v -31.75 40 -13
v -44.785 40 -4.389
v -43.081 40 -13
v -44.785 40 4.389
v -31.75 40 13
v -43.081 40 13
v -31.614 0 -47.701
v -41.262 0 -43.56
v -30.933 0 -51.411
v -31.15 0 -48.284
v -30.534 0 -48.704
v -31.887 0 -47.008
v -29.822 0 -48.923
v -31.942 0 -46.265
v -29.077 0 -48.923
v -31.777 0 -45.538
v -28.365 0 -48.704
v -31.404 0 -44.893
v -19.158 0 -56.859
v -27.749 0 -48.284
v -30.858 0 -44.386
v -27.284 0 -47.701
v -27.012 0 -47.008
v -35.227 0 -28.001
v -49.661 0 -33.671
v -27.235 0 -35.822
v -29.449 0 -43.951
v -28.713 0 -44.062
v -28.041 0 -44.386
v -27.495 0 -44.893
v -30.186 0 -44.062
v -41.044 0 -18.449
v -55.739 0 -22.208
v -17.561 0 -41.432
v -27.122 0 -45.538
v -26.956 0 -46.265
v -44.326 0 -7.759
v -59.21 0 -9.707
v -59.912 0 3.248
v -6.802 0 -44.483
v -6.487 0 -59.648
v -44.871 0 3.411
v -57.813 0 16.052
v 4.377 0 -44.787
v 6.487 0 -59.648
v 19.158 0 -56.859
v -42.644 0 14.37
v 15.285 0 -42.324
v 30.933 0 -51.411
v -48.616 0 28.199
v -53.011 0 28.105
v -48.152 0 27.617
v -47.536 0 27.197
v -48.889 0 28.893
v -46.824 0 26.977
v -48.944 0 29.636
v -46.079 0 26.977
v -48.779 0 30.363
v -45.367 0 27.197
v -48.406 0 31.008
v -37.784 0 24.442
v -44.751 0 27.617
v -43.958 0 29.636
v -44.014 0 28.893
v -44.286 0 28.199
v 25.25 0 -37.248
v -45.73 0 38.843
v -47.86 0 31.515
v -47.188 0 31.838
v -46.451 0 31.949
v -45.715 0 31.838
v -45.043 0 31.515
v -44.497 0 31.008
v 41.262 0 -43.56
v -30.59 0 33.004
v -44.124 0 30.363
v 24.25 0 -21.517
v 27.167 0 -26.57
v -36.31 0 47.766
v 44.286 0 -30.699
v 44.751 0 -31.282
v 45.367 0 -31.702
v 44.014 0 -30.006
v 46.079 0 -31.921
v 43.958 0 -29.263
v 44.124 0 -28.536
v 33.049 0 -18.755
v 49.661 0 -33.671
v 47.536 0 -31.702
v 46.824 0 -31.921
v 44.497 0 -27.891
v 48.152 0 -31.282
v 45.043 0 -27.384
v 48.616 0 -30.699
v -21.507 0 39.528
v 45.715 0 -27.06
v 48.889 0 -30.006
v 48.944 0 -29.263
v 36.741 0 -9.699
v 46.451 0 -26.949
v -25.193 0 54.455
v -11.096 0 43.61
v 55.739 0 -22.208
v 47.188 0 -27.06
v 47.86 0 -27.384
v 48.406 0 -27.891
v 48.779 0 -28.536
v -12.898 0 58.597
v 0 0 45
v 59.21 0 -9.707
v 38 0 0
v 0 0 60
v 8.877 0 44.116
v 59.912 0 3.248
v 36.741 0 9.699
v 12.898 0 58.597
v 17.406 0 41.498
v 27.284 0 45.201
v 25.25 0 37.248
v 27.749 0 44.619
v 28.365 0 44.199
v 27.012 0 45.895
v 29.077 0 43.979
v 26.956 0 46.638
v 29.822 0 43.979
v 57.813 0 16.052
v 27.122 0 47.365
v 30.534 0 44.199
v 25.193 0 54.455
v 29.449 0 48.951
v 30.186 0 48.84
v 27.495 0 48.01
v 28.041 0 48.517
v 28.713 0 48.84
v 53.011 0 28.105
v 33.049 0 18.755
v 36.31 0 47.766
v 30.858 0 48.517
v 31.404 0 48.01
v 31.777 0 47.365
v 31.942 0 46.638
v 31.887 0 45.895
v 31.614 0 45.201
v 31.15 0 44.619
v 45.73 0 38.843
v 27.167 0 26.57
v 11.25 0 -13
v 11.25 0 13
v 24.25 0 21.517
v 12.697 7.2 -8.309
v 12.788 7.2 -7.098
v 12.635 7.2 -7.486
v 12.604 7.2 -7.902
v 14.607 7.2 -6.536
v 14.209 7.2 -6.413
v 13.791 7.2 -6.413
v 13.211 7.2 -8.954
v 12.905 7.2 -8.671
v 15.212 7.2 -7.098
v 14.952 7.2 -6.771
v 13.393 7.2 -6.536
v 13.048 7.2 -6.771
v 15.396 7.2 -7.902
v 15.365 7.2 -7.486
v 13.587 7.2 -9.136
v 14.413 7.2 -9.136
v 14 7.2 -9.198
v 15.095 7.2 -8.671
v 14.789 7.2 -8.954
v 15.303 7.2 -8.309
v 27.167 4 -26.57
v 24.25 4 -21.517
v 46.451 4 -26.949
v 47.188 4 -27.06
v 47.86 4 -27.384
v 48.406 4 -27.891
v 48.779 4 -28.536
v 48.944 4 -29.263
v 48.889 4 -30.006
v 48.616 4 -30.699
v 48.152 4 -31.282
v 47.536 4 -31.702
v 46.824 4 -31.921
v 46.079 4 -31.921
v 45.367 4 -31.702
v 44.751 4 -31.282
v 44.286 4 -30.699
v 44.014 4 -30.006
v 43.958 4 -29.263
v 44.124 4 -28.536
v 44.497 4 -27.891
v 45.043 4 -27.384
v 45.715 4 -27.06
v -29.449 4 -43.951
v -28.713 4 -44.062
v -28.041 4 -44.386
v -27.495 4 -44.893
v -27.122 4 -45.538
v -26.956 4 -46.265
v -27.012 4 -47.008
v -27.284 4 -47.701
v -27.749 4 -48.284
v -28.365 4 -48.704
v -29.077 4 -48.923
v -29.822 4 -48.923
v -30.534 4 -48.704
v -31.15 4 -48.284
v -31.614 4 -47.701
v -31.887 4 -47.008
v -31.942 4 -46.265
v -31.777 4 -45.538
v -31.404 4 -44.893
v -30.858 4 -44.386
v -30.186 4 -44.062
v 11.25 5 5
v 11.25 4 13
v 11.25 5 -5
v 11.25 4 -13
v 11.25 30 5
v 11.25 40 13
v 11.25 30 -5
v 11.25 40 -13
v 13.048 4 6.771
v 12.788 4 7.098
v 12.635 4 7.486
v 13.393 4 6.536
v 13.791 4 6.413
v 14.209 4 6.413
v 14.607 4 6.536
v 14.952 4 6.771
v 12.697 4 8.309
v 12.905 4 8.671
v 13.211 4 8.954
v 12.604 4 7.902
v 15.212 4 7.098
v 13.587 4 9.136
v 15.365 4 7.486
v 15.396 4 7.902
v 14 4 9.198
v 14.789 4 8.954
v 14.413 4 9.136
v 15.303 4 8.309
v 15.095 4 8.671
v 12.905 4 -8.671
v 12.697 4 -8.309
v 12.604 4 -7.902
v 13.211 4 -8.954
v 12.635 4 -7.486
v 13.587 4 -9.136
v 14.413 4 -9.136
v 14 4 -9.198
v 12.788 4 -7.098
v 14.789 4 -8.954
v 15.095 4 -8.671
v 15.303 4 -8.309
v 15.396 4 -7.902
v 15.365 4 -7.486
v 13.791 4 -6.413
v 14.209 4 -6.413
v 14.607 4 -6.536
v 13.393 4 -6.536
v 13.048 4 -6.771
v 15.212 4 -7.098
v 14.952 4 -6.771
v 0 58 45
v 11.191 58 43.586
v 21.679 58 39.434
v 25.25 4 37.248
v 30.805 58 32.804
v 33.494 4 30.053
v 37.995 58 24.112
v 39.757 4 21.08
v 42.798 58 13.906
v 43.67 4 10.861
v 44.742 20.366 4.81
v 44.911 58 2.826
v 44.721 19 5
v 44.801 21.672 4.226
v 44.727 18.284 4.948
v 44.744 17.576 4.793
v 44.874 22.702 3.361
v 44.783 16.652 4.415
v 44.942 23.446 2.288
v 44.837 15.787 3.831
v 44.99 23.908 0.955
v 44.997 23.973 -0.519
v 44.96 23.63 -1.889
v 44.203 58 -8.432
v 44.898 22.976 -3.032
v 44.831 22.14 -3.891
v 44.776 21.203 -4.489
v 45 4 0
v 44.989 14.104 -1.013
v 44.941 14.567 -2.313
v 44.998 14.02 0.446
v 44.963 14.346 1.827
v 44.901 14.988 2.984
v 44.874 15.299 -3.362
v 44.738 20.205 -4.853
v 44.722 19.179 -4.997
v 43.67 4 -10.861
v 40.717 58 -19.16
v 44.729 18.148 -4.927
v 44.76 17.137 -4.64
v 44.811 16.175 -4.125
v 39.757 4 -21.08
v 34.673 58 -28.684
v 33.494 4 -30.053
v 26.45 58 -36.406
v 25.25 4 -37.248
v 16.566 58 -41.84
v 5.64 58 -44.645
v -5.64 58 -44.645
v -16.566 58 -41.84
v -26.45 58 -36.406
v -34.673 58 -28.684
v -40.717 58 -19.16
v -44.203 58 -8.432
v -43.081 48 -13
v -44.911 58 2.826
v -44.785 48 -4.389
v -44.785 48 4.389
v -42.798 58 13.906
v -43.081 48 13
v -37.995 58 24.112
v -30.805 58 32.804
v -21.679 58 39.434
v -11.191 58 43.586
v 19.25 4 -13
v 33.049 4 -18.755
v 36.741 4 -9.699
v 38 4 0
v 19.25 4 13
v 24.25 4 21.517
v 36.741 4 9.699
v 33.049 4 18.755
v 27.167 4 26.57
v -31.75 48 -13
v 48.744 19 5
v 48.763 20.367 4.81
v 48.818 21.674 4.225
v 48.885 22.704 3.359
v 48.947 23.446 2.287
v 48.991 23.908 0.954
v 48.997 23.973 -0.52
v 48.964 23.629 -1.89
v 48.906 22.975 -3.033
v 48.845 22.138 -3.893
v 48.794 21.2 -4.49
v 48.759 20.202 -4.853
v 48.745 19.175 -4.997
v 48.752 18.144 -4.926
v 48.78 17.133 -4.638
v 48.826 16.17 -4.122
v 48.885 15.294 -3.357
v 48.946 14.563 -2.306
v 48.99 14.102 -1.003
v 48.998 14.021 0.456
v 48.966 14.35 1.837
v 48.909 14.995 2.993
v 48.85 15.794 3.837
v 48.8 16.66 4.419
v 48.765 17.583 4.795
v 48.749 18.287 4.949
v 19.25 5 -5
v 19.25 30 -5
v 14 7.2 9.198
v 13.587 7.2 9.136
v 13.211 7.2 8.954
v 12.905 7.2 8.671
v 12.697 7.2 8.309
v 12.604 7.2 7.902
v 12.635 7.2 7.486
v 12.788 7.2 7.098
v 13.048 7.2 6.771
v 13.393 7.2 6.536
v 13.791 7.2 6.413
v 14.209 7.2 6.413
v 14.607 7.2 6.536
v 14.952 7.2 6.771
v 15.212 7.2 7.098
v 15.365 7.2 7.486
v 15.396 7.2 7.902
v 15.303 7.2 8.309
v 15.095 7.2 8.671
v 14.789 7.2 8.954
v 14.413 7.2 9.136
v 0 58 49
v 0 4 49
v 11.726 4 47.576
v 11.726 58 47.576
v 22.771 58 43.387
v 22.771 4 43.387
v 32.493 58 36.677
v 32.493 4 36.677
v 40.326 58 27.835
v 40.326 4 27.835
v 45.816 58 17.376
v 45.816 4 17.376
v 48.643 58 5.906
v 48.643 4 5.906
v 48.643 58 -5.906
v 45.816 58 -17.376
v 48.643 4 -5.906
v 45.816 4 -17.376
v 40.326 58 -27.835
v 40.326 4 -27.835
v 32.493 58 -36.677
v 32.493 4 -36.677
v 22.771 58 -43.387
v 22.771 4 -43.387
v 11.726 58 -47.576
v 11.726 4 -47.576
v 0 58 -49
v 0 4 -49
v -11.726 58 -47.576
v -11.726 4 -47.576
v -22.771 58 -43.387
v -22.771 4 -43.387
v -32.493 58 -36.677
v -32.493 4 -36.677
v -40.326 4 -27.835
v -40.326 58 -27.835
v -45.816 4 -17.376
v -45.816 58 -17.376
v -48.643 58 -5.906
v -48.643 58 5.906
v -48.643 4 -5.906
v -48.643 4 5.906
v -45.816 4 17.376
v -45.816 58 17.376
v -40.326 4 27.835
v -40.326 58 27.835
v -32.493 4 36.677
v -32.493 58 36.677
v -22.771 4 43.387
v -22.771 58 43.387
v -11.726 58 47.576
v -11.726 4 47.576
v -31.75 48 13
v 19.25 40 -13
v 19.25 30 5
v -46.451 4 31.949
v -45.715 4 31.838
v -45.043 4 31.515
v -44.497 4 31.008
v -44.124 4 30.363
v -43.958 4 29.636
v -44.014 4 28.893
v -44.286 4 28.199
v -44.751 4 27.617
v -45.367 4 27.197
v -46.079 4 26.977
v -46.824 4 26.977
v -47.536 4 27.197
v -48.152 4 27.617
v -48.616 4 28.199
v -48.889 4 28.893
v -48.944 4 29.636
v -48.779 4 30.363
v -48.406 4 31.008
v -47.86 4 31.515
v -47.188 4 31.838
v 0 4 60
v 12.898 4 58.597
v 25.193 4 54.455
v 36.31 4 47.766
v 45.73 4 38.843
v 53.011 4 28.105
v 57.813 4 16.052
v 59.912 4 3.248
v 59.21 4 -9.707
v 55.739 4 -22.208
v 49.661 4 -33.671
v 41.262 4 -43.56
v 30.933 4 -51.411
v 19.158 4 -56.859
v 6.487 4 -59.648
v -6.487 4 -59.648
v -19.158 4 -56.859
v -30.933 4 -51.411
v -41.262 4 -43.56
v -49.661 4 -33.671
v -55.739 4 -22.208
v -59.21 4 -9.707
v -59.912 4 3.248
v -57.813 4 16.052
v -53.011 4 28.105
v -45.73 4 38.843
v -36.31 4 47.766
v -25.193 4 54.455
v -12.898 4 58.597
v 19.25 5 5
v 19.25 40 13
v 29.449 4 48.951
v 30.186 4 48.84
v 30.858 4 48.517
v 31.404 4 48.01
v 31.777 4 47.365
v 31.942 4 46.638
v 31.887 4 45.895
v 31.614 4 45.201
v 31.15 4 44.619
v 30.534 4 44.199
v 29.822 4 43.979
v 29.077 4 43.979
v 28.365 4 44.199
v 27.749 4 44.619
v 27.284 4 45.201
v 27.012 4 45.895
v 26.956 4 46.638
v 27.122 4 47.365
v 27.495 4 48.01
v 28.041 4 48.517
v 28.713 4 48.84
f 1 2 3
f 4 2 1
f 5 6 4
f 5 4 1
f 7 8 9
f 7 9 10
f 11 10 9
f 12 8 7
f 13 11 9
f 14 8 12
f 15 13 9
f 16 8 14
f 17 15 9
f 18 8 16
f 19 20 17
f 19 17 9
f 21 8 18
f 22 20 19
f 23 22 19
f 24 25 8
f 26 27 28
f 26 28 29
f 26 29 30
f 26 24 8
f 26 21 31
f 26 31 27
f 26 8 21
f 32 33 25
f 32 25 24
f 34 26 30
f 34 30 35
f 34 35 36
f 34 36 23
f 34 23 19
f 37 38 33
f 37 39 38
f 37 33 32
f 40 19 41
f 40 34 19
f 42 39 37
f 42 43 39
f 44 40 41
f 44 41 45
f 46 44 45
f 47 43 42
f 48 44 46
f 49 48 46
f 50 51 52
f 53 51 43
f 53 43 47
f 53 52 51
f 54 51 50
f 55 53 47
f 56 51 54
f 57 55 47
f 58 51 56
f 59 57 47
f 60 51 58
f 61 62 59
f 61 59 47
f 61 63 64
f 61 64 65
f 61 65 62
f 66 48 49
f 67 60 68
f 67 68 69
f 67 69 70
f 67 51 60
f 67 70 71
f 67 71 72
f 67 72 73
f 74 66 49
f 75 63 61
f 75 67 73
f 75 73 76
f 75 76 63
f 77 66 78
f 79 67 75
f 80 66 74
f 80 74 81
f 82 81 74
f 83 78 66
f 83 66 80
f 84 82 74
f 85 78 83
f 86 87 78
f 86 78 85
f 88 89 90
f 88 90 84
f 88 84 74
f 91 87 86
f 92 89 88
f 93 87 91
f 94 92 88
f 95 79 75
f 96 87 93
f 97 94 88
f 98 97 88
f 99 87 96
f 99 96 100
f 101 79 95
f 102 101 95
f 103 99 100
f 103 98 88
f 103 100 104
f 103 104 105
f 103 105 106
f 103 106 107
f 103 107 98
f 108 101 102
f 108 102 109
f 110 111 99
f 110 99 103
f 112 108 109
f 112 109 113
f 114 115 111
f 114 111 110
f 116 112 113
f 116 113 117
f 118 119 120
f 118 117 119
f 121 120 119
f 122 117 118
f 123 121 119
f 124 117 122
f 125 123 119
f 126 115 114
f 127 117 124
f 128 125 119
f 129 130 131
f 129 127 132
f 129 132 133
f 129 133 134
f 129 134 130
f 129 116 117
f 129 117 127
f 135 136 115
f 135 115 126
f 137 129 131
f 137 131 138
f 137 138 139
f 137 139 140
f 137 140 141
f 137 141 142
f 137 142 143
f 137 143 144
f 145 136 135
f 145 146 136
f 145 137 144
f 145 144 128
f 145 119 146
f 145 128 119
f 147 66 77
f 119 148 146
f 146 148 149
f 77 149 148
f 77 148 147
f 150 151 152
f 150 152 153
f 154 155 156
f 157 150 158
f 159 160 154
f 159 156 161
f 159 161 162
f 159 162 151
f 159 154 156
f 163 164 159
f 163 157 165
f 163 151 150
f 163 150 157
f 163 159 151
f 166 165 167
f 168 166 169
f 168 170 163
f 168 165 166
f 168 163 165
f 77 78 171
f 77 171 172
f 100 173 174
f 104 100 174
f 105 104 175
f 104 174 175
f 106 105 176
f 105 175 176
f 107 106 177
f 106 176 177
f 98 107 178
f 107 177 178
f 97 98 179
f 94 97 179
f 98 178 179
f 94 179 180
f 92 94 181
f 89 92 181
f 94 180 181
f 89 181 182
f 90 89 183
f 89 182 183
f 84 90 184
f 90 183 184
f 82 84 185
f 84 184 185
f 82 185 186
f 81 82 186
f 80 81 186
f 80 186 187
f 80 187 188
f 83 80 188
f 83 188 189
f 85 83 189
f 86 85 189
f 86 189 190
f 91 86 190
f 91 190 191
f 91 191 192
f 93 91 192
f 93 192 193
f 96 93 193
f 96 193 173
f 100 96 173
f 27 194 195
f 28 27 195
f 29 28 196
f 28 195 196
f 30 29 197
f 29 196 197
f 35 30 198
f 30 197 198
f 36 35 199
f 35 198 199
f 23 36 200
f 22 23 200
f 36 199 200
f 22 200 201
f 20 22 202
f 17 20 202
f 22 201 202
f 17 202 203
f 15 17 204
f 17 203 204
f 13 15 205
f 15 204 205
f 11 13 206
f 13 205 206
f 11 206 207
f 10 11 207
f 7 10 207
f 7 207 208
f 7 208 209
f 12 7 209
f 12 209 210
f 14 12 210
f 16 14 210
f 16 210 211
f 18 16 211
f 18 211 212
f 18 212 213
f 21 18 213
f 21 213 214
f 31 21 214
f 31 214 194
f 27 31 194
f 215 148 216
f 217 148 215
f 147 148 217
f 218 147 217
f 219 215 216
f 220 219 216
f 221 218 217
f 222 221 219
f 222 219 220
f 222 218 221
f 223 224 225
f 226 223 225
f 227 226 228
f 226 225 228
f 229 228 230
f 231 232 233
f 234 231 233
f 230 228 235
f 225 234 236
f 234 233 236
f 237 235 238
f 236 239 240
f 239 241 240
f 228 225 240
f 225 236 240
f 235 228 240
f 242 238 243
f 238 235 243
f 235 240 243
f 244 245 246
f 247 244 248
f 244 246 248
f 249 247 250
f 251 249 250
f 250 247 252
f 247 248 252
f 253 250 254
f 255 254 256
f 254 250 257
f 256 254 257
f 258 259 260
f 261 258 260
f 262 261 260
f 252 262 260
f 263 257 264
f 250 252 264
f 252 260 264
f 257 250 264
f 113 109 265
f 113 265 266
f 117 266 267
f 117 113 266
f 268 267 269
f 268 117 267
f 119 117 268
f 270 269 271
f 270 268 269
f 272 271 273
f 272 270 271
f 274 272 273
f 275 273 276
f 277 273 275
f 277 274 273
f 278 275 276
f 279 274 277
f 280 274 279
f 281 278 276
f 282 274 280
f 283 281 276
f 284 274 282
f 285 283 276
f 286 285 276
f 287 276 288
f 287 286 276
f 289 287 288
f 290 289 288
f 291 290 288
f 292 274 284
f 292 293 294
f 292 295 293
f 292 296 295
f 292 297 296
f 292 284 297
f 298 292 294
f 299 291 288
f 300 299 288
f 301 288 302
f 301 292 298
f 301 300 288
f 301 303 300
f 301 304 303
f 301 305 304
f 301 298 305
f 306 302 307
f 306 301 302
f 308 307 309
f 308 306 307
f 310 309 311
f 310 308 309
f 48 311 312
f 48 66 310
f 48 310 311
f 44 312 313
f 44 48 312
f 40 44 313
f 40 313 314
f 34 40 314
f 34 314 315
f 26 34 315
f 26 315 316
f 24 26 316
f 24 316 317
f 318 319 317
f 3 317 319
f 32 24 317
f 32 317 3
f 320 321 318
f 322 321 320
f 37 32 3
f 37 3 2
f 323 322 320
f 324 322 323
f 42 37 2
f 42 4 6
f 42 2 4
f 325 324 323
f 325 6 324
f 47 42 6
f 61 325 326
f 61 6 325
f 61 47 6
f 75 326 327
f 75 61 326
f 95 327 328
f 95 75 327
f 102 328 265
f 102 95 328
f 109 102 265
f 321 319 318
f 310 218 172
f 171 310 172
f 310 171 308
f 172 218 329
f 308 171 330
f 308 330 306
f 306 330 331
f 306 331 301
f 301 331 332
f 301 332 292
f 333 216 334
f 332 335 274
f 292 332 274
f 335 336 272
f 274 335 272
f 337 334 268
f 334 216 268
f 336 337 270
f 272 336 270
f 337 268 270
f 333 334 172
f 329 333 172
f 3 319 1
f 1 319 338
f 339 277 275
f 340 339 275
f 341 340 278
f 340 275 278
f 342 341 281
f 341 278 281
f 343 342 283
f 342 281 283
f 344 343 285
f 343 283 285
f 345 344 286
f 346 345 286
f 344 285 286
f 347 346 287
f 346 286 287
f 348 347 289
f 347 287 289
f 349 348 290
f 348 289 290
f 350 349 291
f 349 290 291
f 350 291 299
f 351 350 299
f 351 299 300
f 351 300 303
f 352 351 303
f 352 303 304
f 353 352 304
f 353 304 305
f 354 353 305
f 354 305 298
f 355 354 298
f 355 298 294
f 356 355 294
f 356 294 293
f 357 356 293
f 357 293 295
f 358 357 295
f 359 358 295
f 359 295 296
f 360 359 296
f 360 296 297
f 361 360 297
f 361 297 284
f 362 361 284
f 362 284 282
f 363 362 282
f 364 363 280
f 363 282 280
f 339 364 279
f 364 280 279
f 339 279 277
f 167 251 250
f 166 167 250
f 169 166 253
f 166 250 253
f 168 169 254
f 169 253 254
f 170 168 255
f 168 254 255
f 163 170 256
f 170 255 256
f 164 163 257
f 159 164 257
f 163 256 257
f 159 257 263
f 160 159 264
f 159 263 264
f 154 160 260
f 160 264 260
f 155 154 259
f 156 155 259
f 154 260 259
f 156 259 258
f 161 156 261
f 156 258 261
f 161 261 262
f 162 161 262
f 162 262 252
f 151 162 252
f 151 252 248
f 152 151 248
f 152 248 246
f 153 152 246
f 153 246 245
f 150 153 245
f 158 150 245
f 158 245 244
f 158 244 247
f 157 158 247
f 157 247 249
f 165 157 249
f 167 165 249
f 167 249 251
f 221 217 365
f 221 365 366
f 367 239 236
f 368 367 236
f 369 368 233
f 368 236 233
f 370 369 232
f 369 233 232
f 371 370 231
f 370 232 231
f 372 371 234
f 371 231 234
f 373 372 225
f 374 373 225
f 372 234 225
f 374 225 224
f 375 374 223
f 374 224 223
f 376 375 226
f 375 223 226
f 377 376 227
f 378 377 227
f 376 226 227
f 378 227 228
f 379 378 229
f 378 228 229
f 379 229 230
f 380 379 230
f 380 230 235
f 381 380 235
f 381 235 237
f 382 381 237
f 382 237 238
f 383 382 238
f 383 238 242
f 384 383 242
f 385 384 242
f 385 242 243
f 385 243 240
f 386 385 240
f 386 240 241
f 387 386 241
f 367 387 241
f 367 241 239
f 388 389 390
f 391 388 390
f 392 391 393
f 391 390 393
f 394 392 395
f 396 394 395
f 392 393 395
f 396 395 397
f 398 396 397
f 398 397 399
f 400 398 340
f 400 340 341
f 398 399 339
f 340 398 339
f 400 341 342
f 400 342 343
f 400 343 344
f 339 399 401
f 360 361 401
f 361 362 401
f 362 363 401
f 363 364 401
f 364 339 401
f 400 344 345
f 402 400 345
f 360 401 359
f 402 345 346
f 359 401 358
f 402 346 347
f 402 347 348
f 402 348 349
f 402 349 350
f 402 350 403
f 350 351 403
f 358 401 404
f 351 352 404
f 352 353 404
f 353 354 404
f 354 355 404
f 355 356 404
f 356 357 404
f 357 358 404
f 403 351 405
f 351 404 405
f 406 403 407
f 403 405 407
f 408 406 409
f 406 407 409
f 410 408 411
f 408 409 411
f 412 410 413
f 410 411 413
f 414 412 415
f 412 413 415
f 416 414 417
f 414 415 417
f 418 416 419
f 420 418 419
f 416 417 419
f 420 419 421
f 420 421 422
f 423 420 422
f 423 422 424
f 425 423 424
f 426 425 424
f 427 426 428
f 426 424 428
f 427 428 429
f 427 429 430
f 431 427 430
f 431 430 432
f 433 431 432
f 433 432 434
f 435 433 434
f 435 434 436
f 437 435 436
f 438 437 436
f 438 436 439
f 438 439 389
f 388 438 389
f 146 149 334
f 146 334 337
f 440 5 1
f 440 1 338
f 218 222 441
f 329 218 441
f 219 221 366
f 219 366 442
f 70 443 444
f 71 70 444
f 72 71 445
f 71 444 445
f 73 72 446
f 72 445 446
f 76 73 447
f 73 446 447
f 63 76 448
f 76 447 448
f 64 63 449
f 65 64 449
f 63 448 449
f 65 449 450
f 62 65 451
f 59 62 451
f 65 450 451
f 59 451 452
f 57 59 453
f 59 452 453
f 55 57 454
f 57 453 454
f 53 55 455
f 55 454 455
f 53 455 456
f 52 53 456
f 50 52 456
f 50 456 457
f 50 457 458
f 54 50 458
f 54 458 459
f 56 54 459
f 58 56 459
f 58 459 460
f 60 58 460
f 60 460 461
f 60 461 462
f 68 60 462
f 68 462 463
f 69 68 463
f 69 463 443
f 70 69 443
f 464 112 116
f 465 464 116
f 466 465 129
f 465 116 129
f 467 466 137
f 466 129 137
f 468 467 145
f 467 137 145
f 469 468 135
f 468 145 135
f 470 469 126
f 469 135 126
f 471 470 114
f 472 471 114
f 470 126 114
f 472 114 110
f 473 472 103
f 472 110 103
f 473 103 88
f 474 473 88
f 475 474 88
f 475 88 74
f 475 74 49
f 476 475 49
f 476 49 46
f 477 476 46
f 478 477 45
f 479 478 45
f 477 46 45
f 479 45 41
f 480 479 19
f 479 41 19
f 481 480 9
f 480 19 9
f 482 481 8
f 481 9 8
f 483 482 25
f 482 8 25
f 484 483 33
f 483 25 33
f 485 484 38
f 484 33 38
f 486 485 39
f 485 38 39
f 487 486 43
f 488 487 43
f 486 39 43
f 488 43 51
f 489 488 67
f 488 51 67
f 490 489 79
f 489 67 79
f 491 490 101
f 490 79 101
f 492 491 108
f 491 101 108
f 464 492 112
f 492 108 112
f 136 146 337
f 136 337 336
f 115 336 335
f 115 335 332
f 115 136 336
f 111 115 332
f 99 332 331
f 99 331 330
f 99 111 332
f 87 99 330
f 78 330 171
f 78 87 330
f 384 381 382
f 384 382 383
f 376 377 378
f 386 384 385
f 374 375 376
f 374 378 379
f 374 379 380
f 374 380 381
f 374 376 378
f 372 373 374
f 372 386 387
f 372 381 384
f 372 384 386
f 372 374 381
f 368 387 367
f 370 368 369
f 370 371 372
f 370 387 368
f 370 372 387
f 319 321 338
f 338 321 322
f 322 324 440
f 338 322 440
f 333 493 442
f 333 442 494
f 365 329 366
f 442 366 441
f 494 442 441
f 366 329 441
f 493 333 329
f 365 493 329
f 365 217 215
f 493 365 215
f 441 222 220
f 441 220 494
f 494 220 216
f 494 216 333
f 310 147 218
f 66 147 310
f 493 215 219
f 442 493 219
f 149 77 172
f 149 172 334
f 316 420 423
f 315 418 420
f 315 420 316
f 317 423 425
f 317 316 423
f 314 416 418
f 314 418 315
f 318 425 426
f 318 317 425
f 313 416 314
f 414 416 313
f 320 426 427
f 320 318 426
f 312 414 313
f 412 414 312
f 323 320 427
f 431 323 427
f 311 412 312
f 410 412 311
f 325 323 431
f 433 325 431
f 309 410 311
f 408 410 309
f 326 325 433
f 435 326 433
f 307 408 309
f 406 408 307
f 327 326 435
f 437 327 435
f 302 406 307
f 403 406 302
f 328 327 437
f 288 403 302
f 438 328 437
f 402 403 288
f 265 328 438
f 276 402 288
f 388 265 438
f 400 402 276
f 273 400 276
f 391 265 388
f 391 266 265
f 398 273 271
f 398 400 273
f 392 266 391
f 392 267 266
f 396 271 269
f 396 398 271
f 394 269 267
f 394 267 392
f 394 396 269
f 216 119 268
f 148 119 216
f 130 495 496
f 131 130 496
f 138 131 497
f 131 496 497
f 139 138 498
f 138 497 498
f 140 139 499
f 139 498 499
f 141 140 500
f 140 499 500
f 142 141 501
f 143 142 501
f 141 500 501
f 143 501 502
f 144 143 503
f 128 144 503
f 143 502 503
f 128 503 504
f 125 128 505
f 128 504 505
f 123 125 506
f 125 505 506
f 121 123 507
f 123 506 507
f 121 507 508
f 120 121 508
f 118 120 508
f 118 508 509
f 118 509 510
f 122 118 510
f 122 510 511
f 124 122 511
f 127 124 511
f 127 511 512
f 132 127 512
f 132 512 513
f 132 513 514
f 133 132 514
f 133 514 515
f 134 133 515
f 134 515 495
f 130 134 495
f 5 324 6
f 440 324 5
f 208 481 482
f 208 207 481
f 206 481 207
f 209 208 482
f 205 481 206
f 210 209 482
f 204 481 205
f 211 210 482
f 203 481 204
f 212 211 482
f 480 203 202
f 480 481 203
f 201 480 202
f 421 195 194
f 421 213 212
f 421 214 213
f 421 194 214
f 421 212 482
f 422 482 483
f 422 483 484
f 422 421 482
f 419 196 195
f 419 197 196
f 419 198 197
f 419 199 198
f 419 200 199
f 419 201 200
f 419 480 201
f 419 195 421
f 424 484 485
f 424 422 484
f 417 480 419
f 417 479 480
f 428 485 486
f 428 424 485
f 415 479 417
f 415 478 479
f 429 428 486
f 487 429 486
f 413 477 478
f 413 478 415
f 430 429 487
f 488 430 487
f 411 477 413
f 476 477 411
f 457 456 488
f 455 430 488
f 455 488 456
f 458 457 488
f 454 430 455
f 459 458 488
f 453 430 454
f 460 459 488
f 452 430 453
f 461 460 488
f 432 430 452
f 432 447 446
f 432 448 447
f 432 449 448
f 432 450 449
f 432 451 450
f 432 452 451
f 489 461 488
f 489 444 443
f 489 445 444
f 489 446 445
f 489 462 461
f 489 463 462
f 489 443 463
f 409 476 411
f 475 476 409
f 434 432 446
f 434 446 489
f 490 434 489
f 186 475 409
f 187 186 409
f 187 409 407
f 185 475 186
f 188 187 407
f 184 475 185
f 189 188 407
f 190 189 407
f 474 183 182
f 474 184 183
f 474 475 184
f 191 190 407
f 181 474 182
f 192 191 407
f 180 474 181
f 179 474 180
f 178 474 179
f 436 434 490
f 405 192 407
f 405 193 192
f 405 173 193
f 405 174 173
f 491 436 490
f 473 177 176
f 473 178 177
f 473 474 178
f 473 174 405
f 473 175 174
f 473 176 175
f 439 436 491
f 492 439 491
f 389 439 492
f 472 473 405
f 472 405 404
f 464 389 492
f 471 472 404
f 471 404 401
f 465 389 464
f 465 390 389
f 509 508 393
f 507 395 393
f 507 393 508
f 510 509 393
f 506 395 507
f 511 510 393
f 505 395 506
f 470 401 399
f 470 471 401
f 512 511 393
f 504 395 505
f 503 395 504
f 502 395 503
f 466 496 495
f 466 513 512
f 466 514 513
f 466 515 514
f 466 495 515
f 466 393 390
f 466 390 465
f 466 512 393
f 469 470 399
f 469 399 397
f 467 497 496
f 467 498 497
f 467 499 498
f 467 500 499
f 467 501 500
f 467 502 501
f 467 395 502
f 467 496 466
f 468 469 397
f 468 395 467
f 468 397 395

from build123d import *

# Parameters (mm, degrees)
SKETCH1_R            = 60
SKETCH1_R_2          = 45
BOSS_EXTRUDE3_DEPTH  = 4
SKETCH9_R            = 49
SKETCH9_R_2          = 45
BOSS_EXTRUDE5_DEPTH  = 54
SKETCH10_W           = 8
SKETCH10_H           = 40
SKETCH10_W_2         = 15
SKETCH10_H_2         = 8
BOSS_EXTRUDE6_DEPTH  = 13
SKETCH12_W           = 10
SKETCH12_H           = 25
CUT_EXTRUDE1_DEPTH   = 8
SKETCH13_R           = 5
CUT_EXTRUDE2_DEPTH   = 110.729496946
SKETCH14_R           = 1.4
CUT_EXTRUDE3_DEPTH   = 7.2
BOSS_EXTRUDE10_DEPTH = 4
SKETCH18_R           = 2.5
CUT_EXTRUDE4_DEPTH   = 101.578327739


with BuildPart() as part:
    # Sketch1 → Boss-Extrude3 (new body)
    with BuildSketch(Plane(origin=(0, 0, 0), x_dir=(1, 0, 0), z_dir=(0, 1, 0))):
        with Locations(Location((0, 0, 0), (0, 0, 270))):
            Circle(SKETCH1_R)
        with Locations(Location((0, 0, 0), (0, 0, 270))):
            Circle(SKETCH1_R_2, mode=Mode.SUBTRACT)
    extrude(amount=BOSS_EXTRUDE3_DEPTH)

    # Sketch9 → Boss-Extrude5 (add)
    with BuildSketch(Plane(origin=(0, 4, 0), x_dir=(1, 0, 0), z_dir=(0, 1, 0))):
        with Locations(Location((0, 0, 0), (0, 0, 270))):
            Circle(SKETCH9_R)
        with Locations(Location((0, 0, 0), (0, 0, 270))):
            Circle(SKETCH9_R_2, mode=Mode.SUBTRACT)
    extrude(amount=BOSS_EXTRUDE5_DEPTH)

    # Sketch10 → Boss-Extrude6 (add, symmetric)
    with BuildSketch(Plane.XY):
        with Locations((15.25, 20)):
            Rectangle(SKETCH10_W, SKETCH10_H)
        with Locations((-39.25, 44)):
            Rectangle(SKETCH10_W_2, SKETCH10_H_2)
    extrude(amount=BOSS_EXTRUDE6_DEPTH, both=True)


with BuildPart() as boss_extrude6_piece_1:
    # of the separate pieces the step leaves, piece 1, a body of its own (boss_extrude6_pieces)
    add(part.part.solids().sort_by_distance((0, 0, 60))[0])

    # Sketch13 → Cut-Extrude2 (cut, through all)
    with BuildSketch(Plane.ZY.offset(-11.25)):
        with Locations((0, 19)):
            Circle(SKETCH13_R)
    extrude(amount=-CUT_EXTRUDE2_DEPTH, mode=Mode.SUBTRACT)



with BuildPart() as boss_extrude6_piece_2:
    # of the separate pieces the step leaves, piece 2, a body of its own (boss_extrude6_pieces)
    add(part.part.solids().sort_by_distance((11.25, 0, -13))[0])

    # Sketch12 → Cut-Extrude1 (cut)
    with BuildSketch(Plane.ZY.offset(-11.25)):
        with Locations((0, 17.5)):
            Rectangle(SKETCH12_W, SKETCH12_H)
    extrude(amount=-CUT_EXTRUDE1_DEPTH, mode=Mode.SUBTRACT)

    # Sketch14 → Cut-Extrude3 (cut)
    with BuildSketch(Plane.XZ):
        with Locations((-34, -7.797761416)):
            Circle(SKETCH14_R)
        with Locations(Location((14, -7.797761416, 0), (0, 0, 270))):
            Circle(SKETCH14_R)
        with Locations(Location((14, 7.797761416, 0), (0, 0, 90))):
            Circle(SKETCH14_R)
        with Locations((-34, 7.797761416)):
            Circle(SKETCH14_R)
    extrude(amount=-CUT_EXTRUDE3_DEPTH, mode=Mode.SUBTRACT)


with BuildPart() as boss_extrude6_piece_1_1:
    add(boss_extrude6_piece_1.part)

    add(boss_extrude6_piece_2.part)  # Boss-Extrude10 merges Boss-Extrude6 piece 2
    # Sketch15 → Boss-Extrude10 (add)
    with BuildSketch(Plane.XZ):
        with BuildLine():
            Line((25.249838503, 37.248431585), (11.25, 13))
            Line((11.25, 13), (11.25, -13))
            Line((11.25, -13), (25.249838503, -37.248431585))
            ThreePointArc((25.249838503, -37.248431585), (39.757029144, -21.080290171), (45, 0))
            ThreePointArc((45, 0), (39.757029144, 21.080290171), (25.249838503, 37.248431585))
        make_face()
        with BuildLine():
            Line((24.25, -21.516660498), (24.25, 21.516660498))
            Line((24.25, 21.516660498), (27.167270196, 26.569520697))
            ThreePointArc((27.167270196, 26.569520697), (38, 0), (27.167270196, -26.569520697))
            Line((27.167270196, -26.569520697), (24.25, -21.516660498))
        make_face(mode=Mode.SUBTRACT)
    extrude(amount=-BOSS_EXTRUDE10_DEPTH)

    # Sketch18 → Cut-Extrude4 (cut, through all)
    with BuildSketch(Plane(origin=(0, 4, 0), x_dir=(1, 0, 0), z_dir=(0, 1, 0))):
        with Locations(Location((46.451404387, 29.449397795, 0), (0, 0, 270))):
            Circle(SKETCH18_R)
        with Locations(Location((29.449397795, -46.451404387, 0), (0, 0, 270))):
            Circle(SKETCH18_R)
        with Locations(Location((-46.451404387, -29.449397795, 0), (0, 0, 270))):
            Circle(SKETCH18_R)
        with Locations(Location((-29.449397795, 46.451404387, 0), (0, 0, 270))):
            Circle(SKETCH18_R)
    extrude(amount=-CUT_EXTRUDE4_DEPTH, mode=Mode.SUBTRACT)


solid = boss_extrude6_piece_1_1.part
